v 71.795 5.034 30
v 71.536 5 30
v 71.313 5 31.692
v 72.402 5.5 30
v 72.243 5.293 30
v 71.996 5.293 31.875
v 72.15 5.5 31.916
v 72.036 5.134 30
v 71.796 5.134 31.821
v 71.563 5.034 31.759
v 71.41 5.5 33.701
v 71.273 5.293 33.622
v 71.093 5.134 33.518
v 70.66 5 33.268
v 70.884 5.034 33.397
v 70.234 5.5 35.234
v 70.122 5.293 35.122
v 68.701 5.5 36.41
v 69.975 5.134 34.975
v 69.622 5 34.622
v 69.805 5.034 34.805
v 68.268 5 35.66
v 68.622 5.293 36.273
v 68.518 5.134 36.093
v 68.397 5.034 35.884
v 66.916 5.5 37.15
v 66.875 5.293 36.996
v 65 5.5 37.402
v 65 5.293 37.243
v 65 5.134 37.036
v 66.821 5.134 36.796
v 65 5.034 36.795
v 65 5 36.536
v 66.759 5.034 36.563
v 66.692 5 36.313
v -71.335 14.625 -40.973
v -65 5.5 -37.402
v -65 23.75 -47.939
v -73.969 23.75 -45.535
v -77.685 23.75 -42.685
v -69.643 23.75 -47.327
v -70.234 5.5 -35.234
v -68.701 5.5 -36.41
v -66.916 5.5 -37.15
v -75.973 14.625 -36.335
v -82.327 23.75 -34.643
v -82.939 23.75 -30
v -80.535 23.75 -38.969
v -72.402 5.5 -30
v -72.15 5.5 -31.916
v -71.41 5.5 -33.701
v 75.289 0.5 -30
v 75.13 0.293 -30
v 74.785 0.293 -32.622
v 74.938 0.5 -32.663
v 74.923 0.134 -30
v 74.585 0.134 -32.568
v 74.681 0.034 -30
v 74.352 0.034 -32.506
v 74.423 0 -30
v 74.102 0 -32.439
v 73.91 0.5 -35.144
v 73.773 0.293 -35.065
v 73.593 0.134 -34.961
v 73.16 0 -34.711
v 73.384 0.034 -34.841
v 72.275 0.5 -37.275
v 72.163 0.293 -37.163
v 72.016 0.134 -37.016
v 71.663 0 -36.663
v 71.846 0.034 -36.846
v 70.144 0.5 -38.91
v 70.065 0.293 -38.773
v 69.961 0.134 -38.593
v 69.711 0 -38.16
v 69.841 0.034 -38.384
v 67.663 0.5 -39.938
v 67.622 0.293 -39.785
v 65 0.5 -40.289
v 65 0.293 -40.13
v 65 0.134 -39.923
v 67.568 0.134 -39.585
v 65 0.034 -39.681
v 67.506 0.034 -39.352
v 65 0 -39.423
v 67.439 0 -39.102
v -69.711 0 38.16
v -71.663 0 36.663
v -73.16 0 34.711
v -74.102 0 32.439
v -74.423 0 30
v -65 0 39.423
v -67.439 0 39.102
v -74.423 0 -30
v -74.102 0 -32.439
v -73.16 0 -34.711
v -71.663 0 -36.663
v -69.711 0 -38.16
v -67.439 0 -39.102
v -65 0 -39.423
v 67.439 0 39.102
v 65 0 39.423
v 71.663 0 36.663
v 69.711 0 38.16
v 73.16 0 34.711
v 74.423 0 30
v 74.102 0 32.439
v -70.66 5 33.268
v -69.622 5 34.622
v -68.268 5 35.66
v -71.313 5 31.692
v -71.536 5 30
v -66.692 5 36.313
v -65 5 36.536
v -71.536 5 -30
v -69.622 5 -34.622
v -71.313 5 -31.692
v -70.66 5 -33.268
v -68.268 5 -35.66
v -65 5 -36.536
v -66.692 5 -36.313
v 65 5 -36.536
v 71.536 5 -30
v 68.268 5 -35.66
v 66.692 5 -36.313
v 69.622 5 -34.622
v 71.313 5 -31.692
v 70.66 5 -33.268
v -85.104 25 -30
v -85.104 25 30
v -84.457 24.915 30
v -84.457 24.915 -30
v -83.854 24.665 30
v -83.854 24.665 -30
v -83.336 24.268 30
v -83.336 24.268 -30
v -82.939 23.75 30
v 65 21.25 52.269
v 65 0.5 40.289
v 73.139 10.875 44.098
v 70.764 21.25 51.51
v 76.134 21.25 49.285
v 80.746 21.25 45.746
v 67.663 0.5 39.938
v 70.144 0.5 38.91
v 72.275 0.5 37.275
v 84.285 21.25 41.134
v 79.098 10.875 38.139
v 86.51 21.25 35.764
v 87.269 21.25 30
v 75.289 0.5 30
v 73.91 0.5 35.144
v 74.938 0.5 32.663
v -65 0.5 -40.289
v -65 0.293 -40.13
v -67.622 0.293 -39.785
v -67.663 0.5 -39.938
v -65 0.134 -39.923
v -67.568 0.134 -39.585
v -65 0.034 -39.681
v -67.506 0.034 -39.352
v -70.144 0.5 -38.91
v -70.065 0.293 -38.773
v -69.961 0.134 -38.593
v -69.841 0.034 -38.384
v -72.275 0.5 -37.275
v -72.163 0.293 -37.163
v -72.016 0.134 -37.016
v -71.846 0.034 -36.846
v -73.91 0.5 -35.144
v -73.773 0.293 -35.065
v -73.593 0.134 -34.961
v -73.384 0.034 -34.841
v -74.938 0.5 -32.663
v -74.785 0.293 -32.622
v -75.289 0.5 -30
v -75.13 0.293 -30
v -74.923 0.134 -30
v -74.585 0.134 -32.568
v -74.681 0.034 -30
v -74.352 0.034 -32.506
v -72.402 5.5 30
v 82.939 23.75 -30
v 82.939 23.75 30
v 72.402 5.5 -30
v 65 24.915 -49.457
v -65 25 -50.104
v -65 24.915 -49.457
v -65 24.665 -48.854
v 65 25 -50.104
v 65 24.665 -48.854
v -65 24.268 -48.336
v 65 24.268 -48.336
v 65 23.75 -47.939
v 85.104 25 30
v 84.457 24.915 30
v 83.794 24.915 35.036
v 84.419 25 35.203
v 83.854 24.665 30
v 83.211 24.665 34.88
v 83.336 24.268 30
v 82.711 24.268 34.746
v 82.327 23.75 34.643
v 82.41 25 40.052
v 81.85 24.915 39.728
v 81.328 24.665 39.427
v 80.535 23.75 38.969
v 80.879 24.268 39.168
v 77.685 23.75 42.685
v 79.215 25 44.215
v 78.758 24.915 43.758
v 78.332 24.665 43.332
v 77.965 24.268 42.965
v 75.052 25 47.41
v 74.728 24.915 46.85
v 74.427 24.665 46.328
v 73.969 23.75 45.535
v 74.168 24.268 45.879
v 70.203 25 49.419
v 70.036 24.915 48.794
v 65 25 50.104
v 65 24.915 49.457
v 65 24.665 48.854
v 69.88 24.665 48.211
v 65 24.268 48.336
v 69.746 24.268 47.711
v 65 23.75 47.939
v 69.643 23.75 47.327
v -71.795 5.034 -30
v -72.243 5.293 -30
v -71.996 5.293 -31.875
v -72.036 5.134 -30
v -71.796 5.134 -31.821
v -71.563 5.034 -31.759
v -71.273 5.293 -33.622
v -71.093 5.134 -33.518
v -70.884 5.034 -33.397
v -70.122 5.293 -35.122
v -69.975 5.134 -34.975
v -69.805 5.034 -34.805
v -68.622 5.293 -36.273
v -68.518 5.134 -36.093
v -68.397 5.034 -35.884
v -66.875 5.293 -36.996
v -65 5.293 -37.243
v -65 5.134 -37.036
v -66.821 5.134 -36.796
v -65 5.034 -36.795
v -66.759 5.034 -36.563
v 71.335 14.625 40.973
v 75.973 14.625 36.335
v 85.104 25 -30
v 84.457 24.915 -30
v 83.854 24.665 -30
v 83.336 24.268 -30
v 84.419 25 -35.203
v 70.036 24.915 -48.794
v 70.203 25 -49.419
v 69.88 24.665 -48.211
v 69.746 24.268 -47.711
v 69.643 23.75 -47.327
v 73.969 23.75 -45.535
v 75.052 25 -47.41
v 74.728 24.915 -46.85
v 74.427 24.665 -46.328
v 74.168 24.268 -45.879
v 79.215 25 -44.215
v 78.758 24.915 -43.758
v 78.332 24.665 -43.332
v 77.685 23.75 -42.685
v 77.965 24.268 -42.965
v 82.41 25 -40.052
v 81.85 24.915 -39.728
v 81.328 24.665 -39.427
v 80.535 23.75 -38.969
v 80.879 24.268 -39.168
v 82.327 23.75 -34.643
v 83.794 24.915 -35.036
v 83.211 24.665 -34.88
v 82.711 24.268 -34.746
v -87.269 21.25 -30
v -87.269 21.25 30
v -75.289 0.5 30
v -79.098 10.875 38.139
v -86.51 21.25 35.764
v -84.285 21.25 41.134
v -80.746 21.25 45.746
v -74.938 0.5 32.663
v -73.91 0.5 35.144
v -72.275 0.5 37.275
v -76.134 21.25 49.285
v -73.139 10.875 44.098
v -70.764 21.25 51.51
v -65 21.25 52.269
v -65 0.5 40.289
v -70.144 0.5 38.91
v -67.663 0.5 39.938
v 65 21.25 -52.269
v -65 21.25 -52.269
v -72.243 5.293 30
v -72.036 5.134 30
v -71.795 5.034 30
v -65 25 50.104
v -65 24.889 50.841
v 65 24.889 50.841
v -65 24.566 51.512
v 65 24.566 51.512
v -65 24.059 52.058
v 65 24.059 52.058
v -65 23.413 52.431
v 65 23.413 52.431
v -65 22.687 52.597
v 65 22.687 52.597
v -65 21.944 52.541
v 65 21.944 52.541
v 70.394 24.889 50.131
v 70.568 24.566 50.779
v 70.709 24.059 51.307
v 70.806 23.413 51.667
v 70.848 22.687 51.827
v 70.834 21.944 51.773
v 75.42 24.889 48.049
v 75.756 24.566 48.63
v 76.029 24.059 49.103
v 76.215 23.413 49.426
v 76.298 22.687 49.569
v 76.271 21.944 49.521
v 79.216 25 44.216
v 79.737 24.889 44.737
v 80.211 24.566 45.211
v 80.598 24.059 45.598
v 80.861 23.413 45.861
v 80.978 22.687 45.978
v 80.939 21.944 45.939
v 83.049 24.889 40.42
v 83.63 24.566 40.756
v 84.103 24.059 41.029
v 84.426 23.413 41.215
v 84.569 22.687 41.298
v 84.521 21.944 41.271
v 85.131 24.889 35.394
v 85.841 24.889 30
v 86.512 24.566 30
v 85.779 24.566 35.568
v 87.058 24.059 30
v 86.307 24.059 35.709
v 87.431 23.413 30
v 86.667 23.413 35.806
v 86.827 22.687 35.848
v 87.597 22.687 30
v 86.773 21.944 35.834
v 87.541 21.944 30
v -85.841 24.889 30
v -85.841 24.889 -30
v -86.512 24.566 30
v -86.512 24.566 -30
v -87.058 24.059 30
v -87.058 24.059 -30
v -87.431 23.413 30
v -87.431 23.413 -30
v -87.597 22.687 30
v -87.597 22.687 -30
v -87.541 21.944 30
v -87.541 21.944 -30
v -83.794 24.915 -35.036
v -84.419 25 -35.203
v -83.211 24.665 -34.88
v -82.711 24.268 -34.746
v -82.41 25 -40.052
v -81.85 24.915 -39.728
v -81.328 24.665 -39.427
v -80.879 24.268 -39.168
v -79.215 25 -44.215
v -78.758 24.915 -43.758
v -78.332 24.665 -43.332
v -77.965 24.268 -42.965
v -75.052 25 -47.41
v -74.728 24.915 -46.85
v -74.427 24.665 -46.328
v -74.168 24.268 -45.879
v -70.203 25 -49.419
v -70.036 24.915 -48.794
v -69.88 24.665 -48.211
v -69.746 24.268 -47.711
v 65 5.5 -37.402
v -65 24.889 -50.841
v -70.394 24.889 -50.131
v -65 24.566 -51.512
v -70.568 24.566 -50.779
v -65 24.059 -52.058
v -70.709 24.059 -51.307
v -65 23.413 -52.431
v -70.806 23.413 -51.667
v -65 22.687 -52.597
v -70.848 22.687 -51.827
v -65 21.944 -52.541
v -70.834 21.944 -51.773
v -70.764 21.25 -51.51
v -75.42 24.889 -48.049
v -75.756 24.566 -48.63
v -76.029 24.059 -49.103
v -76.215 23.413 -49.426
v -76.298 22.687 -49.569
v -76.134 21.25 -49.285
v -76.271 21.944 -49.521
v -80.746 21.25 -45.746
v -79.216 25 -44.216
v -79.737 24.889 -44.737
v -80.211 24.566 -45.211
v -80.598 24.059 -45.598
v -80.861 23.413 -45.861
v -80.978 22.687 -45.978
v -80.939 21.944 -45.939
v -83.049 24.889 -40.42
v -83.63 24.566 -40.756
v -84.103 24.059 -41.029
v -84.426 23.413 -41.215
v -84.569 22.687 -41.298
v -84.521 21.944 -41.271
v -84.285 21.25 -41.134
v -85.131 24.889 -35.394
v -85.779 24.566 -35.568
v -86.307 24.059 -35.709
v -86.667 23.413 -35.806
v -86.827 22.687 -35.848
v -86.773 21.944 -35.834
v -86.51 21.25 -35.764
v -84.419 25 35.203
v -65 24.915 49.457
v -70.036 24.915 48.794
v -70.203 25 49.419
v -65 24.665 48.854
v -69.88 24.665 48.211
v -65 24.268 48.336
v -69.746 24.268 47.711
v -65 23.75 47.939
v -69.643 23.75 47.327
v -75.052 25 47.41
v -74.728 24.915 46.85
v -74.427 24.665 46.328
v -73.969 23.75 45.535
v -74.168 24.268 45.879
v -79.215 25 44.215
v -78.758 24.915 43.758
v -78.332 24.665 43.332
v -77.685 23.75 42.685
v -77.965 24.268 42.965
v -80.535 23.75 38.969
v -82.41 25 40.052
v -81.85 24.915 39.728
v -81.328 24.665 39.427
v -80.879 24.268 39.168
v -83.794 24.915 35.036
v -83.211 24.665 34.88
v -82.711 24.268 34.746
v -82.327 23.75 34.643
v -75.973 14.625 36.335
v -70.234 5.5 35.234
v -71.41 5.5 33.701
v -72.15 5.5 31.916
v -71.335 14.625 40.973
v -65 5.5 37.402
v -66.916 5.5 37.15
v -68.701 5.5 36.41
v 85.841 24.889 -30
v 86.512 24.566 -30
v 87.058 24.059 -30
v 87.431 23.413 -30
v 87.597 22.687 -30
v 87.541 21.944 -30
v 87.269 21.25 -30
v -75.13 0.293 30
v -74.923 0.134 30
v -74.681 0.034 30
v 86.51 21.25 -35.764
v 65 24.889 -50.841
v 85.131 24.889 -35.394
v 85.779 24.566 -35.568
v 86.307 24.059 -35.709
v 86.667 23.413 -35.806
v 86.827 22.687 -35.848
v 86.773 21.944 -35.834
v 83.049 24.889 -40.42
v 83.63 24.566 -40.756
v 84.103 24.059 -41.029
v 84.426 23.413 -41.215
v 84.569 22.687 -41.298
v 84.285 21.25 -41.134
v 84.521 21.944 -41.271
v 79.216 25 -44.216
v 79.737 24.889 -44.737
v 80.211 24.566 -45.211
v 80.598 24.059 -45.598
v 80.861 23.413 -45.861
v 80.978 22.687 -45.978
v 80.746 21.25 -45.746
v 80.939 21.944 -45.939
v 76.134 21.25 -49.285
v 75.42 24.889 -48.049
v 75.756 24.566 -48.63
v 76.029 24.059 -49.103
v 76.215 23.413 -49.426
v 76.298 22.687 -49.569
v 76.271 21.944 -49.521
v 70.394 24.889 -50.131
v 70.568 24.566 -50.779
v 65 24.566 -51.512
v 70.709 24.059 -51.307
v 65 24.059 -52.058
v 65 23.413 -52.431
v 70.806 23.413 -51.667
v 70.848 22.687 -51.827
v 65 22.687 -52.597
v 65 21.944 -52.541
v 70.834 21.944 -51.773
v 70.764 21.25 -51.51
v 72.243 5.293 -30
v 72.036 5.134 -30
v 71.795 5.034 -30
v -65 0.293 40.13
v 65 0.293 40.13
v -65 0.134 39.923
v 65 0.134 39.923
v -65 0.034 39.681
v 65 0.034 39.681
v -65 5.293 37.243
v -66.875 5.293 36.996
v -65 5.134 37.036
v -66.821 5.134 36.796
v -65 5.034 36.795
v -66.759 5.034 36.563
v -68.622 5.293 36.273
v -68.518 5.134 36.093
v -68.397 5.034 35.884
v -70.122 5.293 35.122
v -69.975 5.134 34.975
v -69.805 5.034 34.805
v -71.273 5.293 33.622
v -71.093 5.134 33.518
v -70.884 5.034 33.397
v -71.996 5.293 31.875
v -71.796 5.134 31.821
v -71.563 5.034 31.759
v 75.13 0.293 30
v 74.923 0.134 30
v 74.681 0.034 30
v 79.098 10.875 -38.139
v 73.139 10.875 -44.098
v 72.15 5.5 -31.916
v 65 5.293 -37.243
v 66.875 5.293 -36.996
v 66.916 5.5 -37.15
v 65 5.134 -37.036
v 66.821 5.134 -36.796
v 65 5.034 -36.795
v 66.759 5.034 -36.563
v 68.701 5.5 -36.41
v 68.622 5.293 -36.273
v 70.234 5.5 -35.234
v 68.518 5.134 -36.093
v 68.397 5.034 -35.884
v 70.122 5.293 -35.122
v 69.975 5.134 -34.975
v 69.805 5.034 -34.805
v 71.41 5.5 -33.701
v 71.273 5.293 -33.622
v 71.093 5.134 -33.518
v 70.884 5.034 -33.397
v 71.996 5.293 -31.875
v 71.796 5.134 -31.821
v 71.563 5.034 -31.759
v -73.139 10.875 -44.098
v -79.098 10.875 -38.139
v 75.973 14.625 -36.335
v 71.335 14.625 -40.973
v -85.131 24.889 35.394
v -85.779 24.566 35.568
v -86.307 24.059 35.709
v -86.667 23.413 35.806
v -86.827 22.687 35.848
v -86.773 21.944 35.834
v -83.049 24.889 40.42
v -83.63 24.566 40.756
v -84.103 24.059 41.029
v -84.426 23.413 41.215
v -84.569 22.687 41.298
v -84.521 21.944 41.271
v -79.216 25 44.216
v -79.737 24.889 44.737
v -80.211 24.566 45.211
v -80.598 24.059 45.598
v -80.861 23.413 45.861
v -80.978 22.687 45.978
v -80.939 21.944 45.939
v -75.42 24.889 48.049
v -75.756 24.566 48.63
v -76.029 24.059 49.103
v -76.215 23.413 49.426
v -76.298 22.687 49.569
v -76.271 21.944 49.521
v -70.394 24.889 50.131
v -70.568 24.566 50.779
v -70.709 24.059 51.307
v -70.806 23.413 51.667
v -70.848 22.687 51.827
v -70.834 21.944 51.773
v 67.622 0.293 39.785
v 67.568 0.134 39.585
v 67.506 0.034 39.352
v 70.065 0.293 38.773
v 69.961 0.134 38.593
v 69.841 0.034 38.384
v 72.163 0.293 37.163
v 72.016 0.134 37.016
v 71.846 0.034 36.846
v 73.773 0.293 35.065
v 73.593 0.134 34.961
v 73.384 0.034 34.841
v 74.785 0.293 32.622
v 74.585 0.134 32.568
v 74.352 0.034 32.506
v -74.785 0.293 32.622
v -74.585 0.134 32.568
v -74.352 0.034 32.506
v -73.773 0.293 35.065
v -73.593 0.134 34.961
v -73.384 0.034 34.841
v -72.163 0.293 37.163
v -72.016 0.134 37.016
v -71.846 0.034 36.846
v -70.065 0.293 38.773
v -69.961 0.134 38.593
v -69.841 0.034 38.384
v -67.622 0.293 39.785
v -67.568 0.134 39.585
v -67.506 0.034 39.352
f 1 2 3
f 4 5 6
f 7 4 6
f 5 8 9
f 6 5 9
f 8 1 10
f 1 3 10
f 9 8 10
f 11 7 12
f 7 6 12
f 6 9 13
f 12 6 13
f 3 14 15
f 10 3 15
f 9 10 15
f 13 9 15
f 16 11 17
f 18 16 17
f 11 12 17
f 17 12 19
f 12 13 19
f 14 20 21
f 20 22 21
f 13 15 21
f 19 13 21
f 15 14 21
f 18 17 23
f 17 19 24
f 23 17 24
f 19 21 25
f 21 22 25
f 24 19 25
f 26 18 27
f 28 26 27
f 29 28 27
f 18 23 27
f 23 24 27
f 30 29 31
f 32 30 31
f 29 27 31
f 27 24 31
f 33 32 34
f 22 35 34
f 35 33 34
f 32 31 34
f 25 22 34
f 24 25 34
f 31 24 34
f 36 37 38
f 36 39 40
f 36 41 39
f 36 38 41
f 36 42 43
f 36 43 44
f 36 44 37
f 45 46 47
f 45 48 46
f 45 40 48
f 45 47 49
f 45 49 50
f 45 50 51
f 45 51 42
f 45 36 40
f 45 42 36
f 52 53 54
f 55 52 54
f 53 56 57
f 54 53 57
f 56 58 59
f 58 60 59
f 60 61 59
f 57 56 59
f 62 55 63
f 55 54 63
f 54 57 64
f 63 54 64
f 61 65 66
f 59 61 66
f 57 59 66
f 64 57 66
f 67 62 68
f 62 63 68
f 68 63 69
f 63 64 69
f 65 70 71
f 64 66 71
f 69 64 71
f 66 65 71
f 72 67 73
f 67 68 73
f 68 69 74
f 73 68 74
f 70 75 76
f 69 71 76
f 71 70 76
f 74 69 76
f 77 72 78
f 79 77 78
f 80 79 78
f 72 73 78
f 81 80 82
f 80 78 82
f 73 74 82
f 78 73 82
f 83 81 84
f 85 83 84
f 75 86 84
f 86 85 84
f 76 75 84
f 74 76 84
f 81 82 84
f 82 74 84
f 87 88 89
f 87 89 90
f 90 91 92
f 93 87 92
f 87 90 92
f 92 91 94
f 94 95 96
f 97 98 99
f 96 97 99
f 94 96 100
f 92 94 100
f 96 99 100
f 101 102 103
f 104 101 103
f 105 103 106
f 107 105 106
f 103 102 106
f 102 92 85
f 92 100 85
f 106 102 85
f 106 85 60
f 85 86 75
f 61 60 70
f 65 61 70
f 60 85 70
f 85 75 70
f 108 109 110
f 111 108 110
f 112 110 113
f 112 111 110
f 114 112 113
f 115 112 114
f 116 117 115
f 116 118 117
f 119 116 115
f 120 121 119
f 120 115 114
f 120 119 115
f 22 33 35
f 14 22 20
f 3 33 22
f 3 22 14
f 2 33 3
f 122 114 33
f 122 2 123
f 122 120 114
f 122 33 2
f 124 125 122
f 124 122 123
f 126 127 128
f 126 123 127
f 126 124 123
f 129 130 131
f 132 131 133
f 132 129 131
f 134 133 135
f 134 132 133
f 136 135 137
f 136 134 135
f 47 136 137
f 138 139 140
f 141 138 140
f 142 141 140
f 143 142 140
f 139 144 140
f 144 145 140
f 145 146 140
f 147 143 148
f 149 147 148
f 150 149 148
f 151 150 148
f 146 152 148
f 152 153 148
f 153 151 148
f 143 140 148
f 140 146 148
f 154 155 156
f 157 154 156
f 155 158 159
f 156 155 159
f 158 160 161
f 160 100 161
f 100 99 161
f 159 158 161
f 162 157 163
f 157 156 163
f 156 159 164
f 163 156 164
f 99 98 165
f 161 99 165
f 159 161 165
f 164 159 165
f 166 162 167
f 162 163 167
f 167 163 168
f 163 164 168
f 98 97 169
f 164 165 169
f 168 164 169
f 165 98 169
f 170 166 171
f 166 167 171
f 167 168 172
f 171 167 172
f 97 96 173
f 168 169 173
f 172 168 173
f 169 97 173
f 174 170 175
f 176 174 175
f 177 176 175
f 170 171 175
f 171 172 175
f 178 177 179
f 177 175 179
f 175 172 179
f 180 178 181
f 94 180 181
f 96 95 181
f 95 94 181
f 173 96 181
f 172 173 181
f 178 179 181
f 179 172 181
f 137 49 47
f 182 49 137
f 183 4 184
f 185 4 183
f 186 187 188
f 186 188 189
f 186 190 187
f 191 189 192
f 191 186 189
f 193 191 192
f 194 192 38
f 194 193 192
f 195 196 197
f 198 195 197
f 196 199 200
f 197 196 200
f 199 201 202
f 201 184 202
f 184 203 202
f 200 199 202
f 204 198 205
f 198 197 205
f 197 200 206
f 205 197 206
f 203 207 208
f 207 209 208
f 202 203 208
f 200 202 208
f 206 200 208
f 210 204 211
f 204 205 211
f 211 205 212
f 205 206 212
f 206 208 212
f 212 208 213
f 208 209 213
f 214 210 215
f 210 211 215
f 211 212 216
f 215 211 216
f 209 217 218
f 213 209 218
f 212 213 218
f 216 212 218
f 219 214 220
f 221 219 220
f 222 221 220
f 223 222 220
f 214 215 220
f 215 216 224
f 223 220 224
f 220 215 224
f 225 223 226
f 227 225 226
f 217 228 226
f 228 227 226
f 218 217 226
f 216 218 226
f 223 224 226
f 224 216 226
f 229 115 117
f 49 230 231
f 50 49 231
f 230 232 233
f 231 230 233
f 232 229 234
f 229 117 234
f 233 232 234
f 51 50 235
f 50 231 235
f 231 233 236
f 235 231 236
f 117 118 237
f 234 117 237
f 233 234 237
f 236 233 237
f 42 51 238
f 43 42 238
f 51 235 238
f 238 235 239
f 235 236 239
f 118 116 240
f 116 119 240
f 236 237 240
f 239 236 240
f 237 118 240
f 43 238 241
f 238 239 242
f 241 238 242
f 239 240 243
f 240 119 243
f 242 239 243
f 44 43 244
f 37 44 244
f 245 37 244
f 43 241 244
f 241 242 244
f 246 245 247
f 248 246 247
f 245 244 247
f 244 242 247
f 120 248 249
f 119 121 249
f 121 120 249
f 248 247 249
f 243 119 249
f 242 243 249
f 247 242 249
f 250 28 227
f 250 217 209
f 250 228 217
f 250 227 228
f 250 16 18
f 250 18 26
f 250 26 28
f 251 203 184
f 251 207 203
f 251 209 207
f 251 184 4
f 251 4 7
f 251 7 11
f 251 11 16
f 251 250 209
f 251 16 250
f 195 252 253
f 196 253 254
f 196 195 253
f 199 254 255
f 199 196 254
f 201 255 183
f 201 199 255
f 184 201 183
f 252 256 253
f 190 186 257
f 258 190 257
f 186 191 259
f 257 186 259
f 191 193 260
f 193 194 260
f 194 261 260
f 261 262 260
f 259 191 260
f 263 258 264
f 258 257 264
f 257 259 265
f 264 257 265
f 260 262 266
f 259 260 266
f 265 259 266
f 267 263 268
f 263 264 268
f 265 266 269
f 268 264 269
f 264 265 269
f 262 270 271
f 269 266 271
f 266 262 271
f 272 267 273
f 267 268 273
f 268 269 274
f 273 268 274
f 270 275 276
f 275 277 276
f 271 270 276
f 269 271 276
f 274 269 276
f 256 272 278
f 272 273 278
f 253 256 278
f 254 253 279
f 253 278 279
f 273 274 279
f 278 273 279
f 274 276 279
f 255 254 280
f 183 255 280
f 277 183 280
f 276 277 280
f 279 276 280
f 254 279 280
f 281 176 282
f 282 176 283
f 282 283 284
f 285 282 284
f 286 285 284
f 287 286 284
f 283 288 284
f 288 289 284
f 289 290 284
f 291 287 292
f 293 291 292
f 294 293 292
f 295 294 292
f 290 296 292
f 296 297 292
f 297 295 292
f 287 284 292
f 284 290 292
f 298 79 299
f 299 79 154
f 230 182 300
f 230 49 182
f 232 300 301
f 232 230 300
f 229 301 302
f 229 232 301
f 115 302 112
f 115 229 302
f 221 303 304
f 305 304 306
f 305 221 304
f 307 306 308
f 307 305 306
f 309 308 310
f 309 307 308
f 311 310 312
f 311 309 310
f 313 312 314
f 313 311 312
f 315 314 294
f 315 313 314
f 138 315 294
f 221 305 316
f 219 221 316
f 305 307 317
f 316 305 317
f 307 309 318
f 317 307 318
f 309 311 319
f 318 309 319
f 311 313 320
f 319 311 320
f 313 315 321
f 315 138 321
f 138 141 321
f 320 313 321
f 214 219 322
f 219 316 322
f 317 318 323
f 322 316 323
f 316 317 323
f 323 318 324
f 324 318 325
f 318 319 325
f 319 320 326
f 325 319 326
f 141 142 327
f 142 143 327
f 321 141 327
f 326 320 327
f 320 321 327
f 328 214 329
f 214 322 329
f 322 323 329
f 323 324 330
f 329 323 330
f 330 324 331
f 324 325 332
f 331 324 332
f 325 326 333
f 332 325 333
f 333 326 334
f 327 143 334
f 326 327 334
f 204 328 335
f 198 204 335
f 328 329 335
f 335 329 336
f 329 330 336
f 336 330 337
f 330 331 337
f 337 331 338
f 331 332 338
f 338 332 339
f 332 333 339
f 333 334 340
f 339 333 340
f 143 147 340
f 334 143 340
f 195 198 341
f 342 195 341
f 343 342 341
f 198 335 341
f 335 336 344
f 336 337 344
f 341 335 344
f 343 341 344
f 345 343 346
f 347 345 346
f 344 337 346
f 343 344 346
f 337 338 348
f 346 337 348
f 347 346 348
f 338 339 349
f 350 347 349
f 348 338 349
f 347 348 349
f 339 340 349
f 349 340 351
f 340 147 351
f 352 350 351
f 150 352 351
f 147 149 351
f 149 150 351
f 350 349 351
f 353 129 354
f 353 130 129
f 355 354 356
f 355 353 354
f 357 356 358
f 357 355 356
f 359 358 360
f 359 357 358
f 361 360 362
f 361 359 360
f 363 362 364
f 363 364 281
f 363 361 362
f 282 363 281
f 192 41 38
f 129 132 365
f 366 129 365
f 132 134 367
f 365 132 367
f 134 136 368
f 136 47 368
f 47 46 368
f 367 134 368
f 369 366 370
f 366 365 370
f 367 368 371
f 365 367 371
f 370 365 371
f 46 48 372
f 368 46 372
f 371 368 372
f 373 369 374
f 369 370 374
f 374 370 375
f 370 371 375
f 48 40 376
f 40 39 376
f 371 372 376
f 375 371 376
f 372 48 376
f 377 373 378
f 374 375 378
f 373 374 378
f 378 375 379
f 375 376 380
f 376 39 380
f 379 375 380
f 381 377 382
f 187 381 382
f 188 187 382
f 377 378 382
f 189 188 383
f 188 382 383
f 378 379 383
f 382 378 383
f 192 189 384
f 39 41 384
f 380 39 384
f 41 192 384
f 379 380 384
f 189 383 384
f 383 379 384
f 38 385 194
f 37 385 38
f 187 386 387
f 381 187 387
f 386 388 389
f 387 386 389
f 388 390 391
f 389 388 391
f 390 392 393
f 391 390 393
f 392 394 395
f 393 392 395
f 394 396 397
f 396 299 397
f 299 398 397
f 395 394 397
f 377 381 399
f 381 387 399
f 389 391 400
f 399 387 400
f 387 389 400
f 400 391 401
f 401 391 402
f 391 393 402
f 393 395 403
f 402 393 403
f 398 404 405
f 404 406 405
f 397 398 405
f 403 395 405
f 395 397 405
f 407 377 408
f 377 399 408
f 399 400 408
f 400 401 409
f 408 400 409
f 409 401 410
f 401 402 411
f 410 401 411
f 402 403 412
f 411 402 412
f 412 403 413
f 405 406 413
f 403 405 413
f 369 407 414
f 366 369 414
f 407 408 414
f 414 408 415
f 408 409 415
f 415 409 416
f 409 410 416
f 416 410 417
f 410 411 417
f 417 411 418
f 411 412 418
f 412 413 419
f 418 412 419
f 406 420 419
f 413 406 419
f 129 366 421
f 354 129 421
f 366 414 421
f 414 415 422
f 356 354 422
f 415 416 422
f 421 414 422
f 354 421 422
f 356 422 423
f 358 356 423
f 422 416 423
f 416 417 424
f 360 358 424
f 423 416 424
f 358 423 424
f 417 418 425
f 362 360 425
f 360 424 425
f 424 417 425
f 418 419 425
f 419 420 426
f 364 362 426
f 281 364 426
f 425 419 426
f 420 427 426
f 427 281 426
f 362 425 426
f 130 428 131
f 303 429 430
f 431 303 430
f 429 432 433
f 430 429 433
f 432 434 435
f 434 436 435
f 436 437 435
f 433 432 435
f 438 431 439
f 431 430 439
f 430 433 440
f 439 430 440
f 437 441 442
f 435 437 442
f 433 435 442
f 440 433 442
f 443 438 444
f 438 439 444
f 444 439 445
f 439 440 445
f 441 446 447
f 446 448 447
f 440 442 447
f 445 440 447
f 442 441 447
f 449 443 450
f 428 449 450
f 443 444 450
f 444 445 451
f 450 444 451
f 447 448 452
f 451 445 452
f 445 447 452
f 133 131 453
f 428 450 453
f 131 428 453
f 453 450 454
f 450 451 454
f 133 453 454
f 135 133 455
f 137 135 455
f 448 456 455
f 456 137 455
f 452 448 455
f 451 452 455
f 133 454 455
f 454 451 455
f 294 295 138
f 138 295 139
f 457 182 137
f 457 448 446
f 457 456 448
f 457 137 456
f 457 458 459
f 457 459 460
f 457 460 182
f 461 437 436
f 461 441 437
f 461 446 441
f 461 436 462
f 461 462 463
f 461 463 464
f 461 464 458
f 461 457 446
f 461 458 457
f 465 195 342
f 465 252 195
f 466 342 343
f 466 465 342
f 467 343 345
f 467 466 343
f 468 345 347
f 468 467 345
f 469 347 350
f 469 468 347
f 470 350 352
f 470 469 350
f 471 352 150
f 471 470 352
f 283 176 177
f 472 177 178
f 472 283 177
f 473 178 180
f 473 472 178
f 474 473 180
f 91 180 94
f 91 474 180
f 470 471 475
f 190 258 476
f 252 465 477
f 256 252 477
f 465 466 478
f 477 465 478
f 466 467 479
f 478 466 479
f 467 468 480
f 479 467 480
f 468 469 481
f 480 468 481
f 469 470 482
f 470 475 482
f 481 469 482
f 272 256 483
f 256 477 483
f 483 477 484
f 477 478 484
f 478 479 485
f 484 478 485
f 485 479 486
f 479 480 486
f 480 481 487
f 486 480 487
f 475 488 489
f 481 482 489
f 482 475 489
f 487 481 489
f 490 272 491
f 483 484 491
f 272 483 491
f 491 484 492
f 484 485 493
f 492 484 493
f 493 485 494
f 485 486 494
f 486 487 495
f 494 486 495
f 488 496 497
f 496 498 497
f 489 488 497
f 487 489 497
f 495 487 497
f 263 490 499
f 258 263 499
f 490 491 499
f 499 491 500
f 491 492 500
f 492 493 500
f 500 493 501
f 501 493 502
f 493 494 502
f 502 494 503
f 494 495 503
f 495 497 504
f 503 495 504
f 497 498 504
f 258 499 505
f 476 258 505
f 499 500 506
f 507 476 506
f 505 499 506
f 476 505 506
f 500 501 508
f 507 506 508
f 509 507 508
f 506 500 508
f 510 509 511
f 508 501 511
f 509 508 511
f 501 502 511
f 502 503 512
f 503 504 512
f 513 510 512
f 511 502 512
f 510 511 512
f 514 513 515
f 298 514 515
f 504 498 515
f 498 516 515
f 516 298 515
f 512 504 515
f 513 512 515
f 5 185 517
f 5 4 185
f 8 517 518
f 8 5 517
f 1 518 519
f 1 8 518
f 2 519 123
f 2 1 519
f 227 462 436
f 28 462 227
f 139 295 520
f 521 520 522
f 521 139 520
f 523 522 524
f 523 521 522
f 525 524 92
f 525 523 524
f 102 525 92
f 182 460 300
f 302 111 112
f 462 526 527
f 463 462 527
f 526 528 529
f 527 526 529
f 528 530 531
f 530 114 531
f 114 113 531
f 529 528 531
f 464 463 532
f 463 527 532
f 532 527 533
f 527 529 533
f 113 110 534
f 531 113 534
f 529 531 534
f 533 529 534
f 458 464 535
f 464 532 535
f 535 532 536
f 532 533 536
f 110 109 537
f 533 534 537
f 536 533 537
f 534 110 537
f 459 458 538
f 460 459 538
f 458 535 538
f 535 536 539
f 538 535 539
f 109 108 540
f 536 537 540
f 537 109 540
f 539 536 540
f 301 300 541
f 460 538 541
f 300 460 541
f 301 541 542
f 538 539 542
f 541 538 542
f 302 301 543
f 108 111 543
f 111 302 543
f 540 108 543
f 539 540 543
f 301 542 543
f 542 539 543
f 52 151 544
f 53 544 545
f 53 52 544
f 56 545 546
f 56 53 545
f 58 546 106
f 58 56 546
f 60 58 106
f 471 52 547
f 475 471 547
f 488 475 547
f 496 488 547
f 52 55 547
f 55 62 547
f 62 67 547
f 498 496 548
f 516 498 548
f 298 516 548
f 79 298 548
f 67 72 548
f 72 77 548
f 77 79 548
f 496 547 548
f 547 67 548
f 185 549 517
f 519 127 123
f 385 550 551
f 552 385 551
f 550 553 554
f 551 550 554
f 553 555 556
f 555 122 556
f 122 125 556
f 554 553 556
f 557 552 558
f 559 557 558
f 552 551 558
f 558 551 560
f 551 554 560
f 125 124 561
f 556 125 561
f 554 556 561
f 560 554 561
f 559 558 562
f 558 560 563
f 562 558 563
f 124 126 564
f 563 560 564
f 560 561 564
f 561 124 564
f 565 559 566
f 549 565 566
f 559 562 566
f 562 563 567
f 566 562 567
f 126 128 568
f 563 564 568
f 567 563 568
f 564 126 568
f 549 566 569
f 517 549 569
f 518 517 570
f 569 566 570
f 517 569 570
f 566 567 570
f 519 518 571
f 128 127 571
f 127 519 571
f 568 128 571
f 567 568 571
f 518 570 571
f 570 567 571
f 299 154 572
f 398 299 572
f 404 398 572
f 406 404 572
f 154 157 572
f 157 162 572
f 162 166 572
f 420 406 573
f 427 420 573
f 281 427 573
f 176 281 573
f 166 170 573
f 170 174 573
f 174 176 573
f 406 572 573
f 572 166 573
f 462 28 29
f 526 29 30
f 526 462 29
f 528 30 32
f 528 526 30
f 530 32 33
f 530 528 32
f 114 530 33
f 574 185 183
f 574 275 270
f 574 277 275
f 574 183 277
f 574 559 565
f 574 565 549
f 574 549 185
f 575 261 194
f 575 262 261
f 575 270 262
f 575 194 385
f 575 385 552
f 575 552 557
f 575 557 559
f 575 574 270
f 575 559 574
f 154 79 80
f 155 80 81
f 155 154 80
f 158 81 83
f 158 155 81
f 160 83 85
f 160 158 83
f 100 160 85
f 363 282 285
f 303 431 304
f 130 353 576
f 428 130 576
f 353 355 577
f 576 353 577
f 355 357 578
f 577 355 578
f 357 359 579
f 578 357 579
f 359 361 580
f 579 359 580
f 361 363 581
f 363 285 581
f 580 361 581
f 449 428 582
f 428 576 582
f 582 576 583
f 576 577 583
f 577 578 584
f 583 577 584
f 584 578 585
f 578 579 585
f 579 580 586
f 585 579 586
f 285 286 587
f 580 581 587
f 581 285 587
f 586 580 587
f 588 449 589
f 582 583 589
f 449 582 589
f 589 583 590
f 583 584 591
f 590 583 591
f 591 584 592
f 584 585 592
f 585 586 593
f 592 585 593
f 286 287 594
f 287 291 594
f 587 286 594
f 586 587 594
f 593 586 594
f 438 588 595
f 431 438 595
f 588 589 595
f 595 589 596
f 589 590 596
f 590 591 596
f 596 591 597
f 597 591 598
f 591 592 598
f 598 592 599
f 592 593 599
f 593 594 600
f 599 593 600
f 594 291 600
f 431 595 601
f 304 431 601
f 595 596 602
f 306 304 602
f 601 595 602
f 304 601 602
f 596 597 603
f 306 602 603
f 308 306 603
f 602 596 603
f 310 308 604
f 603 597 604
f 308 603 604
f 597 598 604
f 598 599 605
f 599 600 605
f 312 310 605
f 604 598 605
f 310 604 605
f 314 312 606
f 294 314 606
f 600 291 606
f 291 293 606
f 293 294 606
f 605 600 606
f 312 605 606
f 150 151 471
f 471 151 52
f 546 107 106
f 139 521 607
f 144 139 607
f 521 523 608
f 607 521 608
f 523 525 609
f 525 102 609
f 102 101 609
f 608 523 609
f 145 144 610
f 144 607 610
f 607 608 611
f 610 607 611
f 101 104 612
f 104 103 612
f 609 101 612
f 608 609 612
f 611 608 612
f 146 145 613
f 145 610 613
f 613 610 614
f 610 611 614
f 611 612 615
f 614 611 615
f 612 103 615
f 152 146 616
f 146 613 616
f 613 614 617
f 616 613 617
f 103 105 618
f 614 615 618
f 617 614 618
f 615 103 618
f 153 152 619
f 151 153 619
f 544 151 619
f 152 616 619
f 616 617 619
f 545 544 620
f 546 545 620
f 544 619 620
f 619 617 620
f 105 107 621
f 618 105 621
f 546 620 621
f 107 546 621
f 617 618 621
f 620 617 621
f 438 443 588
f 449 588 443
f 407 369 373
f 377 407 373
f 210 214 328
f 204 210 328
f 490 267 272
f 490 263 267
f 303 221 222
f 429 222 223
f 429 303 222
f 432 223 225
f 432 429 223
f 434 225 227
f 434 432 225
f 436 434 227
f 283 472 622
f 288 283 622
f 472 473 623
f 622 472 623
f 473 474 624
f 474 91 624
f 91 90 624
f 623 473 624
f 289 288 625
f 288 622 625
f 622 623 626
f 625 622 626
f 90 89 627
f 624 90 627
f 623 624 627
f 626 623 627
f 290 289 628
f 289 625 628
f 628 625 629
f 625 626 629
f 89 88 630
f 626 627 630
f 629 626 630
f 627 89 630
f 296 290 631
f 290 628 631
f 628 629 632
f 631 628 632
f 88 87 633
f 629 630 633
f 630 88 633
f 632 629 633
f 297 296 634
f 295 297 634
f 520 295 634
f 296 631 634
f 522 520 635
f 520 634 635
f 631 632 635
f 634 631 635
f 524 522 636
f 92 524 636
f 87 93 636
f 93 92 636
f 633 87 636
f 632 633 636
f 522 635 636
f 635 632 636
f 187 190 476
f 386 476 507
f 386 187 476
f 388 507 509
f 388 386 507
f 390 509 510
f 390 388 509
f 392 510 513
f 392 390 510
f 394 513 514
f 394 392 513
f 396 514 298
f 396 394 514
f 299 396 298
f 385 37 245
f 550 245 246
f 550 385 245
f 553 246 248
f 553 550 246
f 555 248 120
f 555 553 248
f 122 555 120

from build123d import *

# Parameters (mm, degrees)
BOSS_EXTRUDE1_DEPTH = 25
BOSS_EXTRUDE1_DRAFT = -30
SHELL1_T            = -5
FILLET1_R           = 1
FILLET2_R           = 2.5
FILLET3_R           = 1


with BuildPart() as part:
    # Sketch1 → Boss-Extrude1 (with draft: the straight prism first)
    with BuildSketch(Plane(origin=(0, 0, 0), x_dir=(1, 0, 0), z_dir=(0, 1, 0))):
        with BuildLine():
            Line((-65, -40), (65, -40))
            ThreePointArc((65, -40), (72.071067812, -37.071067812), (75, -30))
            Line((75, -30), (75, 30))
            ThreePointArc((75, 30), (72.071067812, 37.071067812), (65, 40))
            Line((65, 40), (-65, 40))
            ThreePointArc((-65, 40), (-72.071067812, 37.071067812), (-75, 30))
            Line((-75, 30), (-75, -30))
            ThreePointArc((-75, -30), (-72.071067812, -37.071067812), (-65, -40))
        make_face()
    extrude(amount=BOSS_EXTRUDE1_DEPTH)
    # Boss-Extrude1: the draft: its side faces are tilted about the plane it starts from
    boss_extrude1_sides = [part.faces().sort_by_distance(p)[0] for p in [
        (0, 12.5, 40),
        (72.071067812, 12.5, 37.071067812),
        (75, 12.5, 0),
        (72.071067812, 12.5, -37.071067812),
        (0, 12.5, -40),
        (-72.071067812, 12.5, -37.071067812),
        (-75, 12.5, 0),
        (-72.071067812, 12.5, 37.071067812),
    ]]
    draft(boss_extrude1_sides, Plane(origin=(0, 0, 0), x_dir=(1, 0, 0), z_dir=(0, 1, 0)), BOSS_EXTRUDE1_DRAFT)

    # Shell1
    shell1_openings = [part.faces().sort_by_distance(p)[0] for p in [
        (0, 25, 0),
    ]]
    offset(amount=SHELL1_T, openings=shell1_openings, kind=Kind.INTERSECTION)

    # Fillet1
    fillet1_edges = [part.edges().sort_by_distance(p)[0] for p in [
        (70.02982636, 5, -35.02982636),
        (0, 5, -37.113248654),
        (-70.02982636, 5, -35.02982636),
        (-72.113248654, 5, 0),
        (-70.02982636, 5, 35.02982636),
        (0, 5, 37.113248654),
        (70.02982636, 5, 35.02982636),
        (72.113248654, 5, 0),
    ]]
    fillet(fillet1_edges, radius=FILLET1_R)

    # Fillet2
    fillet2_edges = [part.edges().sort_by_distance(p)[0] for p in [
        (-89.43375673, 25, 0),
        (0, 25, 54.43375673),
        (89.43375673, 25, 0),
        (0, 25, -48.660254038),
        (-83.660254038, 25, 0),
        (0, 25, 48.660254038),
        (83.660254038, 25, 0),
        (0, 25, -54.43375673),
    ]]
    fillet(fillet2_edges, radius=FILLET2_R - 0.0001)  # a hair under: the kernel refuses the full size

    # Fillet3
    fillet3_edges = [part.edges().sort_by_distance(p)[0] for p in [
        (-75, 0, 0),
        (-72.071067812, 0, -37.071067812),
        (0, 0, -40),
        (72.071067812, 0, -37.071067812),
        (75, 0, 0),
        (72.071067812, 0, 37.071067812),
        (0, 0, 40),
        (-72.071067812, 0, 37.071067812),
    ]]
    fillet(fillet3_edges, radius=FILLET3_R)


solid = part.part
